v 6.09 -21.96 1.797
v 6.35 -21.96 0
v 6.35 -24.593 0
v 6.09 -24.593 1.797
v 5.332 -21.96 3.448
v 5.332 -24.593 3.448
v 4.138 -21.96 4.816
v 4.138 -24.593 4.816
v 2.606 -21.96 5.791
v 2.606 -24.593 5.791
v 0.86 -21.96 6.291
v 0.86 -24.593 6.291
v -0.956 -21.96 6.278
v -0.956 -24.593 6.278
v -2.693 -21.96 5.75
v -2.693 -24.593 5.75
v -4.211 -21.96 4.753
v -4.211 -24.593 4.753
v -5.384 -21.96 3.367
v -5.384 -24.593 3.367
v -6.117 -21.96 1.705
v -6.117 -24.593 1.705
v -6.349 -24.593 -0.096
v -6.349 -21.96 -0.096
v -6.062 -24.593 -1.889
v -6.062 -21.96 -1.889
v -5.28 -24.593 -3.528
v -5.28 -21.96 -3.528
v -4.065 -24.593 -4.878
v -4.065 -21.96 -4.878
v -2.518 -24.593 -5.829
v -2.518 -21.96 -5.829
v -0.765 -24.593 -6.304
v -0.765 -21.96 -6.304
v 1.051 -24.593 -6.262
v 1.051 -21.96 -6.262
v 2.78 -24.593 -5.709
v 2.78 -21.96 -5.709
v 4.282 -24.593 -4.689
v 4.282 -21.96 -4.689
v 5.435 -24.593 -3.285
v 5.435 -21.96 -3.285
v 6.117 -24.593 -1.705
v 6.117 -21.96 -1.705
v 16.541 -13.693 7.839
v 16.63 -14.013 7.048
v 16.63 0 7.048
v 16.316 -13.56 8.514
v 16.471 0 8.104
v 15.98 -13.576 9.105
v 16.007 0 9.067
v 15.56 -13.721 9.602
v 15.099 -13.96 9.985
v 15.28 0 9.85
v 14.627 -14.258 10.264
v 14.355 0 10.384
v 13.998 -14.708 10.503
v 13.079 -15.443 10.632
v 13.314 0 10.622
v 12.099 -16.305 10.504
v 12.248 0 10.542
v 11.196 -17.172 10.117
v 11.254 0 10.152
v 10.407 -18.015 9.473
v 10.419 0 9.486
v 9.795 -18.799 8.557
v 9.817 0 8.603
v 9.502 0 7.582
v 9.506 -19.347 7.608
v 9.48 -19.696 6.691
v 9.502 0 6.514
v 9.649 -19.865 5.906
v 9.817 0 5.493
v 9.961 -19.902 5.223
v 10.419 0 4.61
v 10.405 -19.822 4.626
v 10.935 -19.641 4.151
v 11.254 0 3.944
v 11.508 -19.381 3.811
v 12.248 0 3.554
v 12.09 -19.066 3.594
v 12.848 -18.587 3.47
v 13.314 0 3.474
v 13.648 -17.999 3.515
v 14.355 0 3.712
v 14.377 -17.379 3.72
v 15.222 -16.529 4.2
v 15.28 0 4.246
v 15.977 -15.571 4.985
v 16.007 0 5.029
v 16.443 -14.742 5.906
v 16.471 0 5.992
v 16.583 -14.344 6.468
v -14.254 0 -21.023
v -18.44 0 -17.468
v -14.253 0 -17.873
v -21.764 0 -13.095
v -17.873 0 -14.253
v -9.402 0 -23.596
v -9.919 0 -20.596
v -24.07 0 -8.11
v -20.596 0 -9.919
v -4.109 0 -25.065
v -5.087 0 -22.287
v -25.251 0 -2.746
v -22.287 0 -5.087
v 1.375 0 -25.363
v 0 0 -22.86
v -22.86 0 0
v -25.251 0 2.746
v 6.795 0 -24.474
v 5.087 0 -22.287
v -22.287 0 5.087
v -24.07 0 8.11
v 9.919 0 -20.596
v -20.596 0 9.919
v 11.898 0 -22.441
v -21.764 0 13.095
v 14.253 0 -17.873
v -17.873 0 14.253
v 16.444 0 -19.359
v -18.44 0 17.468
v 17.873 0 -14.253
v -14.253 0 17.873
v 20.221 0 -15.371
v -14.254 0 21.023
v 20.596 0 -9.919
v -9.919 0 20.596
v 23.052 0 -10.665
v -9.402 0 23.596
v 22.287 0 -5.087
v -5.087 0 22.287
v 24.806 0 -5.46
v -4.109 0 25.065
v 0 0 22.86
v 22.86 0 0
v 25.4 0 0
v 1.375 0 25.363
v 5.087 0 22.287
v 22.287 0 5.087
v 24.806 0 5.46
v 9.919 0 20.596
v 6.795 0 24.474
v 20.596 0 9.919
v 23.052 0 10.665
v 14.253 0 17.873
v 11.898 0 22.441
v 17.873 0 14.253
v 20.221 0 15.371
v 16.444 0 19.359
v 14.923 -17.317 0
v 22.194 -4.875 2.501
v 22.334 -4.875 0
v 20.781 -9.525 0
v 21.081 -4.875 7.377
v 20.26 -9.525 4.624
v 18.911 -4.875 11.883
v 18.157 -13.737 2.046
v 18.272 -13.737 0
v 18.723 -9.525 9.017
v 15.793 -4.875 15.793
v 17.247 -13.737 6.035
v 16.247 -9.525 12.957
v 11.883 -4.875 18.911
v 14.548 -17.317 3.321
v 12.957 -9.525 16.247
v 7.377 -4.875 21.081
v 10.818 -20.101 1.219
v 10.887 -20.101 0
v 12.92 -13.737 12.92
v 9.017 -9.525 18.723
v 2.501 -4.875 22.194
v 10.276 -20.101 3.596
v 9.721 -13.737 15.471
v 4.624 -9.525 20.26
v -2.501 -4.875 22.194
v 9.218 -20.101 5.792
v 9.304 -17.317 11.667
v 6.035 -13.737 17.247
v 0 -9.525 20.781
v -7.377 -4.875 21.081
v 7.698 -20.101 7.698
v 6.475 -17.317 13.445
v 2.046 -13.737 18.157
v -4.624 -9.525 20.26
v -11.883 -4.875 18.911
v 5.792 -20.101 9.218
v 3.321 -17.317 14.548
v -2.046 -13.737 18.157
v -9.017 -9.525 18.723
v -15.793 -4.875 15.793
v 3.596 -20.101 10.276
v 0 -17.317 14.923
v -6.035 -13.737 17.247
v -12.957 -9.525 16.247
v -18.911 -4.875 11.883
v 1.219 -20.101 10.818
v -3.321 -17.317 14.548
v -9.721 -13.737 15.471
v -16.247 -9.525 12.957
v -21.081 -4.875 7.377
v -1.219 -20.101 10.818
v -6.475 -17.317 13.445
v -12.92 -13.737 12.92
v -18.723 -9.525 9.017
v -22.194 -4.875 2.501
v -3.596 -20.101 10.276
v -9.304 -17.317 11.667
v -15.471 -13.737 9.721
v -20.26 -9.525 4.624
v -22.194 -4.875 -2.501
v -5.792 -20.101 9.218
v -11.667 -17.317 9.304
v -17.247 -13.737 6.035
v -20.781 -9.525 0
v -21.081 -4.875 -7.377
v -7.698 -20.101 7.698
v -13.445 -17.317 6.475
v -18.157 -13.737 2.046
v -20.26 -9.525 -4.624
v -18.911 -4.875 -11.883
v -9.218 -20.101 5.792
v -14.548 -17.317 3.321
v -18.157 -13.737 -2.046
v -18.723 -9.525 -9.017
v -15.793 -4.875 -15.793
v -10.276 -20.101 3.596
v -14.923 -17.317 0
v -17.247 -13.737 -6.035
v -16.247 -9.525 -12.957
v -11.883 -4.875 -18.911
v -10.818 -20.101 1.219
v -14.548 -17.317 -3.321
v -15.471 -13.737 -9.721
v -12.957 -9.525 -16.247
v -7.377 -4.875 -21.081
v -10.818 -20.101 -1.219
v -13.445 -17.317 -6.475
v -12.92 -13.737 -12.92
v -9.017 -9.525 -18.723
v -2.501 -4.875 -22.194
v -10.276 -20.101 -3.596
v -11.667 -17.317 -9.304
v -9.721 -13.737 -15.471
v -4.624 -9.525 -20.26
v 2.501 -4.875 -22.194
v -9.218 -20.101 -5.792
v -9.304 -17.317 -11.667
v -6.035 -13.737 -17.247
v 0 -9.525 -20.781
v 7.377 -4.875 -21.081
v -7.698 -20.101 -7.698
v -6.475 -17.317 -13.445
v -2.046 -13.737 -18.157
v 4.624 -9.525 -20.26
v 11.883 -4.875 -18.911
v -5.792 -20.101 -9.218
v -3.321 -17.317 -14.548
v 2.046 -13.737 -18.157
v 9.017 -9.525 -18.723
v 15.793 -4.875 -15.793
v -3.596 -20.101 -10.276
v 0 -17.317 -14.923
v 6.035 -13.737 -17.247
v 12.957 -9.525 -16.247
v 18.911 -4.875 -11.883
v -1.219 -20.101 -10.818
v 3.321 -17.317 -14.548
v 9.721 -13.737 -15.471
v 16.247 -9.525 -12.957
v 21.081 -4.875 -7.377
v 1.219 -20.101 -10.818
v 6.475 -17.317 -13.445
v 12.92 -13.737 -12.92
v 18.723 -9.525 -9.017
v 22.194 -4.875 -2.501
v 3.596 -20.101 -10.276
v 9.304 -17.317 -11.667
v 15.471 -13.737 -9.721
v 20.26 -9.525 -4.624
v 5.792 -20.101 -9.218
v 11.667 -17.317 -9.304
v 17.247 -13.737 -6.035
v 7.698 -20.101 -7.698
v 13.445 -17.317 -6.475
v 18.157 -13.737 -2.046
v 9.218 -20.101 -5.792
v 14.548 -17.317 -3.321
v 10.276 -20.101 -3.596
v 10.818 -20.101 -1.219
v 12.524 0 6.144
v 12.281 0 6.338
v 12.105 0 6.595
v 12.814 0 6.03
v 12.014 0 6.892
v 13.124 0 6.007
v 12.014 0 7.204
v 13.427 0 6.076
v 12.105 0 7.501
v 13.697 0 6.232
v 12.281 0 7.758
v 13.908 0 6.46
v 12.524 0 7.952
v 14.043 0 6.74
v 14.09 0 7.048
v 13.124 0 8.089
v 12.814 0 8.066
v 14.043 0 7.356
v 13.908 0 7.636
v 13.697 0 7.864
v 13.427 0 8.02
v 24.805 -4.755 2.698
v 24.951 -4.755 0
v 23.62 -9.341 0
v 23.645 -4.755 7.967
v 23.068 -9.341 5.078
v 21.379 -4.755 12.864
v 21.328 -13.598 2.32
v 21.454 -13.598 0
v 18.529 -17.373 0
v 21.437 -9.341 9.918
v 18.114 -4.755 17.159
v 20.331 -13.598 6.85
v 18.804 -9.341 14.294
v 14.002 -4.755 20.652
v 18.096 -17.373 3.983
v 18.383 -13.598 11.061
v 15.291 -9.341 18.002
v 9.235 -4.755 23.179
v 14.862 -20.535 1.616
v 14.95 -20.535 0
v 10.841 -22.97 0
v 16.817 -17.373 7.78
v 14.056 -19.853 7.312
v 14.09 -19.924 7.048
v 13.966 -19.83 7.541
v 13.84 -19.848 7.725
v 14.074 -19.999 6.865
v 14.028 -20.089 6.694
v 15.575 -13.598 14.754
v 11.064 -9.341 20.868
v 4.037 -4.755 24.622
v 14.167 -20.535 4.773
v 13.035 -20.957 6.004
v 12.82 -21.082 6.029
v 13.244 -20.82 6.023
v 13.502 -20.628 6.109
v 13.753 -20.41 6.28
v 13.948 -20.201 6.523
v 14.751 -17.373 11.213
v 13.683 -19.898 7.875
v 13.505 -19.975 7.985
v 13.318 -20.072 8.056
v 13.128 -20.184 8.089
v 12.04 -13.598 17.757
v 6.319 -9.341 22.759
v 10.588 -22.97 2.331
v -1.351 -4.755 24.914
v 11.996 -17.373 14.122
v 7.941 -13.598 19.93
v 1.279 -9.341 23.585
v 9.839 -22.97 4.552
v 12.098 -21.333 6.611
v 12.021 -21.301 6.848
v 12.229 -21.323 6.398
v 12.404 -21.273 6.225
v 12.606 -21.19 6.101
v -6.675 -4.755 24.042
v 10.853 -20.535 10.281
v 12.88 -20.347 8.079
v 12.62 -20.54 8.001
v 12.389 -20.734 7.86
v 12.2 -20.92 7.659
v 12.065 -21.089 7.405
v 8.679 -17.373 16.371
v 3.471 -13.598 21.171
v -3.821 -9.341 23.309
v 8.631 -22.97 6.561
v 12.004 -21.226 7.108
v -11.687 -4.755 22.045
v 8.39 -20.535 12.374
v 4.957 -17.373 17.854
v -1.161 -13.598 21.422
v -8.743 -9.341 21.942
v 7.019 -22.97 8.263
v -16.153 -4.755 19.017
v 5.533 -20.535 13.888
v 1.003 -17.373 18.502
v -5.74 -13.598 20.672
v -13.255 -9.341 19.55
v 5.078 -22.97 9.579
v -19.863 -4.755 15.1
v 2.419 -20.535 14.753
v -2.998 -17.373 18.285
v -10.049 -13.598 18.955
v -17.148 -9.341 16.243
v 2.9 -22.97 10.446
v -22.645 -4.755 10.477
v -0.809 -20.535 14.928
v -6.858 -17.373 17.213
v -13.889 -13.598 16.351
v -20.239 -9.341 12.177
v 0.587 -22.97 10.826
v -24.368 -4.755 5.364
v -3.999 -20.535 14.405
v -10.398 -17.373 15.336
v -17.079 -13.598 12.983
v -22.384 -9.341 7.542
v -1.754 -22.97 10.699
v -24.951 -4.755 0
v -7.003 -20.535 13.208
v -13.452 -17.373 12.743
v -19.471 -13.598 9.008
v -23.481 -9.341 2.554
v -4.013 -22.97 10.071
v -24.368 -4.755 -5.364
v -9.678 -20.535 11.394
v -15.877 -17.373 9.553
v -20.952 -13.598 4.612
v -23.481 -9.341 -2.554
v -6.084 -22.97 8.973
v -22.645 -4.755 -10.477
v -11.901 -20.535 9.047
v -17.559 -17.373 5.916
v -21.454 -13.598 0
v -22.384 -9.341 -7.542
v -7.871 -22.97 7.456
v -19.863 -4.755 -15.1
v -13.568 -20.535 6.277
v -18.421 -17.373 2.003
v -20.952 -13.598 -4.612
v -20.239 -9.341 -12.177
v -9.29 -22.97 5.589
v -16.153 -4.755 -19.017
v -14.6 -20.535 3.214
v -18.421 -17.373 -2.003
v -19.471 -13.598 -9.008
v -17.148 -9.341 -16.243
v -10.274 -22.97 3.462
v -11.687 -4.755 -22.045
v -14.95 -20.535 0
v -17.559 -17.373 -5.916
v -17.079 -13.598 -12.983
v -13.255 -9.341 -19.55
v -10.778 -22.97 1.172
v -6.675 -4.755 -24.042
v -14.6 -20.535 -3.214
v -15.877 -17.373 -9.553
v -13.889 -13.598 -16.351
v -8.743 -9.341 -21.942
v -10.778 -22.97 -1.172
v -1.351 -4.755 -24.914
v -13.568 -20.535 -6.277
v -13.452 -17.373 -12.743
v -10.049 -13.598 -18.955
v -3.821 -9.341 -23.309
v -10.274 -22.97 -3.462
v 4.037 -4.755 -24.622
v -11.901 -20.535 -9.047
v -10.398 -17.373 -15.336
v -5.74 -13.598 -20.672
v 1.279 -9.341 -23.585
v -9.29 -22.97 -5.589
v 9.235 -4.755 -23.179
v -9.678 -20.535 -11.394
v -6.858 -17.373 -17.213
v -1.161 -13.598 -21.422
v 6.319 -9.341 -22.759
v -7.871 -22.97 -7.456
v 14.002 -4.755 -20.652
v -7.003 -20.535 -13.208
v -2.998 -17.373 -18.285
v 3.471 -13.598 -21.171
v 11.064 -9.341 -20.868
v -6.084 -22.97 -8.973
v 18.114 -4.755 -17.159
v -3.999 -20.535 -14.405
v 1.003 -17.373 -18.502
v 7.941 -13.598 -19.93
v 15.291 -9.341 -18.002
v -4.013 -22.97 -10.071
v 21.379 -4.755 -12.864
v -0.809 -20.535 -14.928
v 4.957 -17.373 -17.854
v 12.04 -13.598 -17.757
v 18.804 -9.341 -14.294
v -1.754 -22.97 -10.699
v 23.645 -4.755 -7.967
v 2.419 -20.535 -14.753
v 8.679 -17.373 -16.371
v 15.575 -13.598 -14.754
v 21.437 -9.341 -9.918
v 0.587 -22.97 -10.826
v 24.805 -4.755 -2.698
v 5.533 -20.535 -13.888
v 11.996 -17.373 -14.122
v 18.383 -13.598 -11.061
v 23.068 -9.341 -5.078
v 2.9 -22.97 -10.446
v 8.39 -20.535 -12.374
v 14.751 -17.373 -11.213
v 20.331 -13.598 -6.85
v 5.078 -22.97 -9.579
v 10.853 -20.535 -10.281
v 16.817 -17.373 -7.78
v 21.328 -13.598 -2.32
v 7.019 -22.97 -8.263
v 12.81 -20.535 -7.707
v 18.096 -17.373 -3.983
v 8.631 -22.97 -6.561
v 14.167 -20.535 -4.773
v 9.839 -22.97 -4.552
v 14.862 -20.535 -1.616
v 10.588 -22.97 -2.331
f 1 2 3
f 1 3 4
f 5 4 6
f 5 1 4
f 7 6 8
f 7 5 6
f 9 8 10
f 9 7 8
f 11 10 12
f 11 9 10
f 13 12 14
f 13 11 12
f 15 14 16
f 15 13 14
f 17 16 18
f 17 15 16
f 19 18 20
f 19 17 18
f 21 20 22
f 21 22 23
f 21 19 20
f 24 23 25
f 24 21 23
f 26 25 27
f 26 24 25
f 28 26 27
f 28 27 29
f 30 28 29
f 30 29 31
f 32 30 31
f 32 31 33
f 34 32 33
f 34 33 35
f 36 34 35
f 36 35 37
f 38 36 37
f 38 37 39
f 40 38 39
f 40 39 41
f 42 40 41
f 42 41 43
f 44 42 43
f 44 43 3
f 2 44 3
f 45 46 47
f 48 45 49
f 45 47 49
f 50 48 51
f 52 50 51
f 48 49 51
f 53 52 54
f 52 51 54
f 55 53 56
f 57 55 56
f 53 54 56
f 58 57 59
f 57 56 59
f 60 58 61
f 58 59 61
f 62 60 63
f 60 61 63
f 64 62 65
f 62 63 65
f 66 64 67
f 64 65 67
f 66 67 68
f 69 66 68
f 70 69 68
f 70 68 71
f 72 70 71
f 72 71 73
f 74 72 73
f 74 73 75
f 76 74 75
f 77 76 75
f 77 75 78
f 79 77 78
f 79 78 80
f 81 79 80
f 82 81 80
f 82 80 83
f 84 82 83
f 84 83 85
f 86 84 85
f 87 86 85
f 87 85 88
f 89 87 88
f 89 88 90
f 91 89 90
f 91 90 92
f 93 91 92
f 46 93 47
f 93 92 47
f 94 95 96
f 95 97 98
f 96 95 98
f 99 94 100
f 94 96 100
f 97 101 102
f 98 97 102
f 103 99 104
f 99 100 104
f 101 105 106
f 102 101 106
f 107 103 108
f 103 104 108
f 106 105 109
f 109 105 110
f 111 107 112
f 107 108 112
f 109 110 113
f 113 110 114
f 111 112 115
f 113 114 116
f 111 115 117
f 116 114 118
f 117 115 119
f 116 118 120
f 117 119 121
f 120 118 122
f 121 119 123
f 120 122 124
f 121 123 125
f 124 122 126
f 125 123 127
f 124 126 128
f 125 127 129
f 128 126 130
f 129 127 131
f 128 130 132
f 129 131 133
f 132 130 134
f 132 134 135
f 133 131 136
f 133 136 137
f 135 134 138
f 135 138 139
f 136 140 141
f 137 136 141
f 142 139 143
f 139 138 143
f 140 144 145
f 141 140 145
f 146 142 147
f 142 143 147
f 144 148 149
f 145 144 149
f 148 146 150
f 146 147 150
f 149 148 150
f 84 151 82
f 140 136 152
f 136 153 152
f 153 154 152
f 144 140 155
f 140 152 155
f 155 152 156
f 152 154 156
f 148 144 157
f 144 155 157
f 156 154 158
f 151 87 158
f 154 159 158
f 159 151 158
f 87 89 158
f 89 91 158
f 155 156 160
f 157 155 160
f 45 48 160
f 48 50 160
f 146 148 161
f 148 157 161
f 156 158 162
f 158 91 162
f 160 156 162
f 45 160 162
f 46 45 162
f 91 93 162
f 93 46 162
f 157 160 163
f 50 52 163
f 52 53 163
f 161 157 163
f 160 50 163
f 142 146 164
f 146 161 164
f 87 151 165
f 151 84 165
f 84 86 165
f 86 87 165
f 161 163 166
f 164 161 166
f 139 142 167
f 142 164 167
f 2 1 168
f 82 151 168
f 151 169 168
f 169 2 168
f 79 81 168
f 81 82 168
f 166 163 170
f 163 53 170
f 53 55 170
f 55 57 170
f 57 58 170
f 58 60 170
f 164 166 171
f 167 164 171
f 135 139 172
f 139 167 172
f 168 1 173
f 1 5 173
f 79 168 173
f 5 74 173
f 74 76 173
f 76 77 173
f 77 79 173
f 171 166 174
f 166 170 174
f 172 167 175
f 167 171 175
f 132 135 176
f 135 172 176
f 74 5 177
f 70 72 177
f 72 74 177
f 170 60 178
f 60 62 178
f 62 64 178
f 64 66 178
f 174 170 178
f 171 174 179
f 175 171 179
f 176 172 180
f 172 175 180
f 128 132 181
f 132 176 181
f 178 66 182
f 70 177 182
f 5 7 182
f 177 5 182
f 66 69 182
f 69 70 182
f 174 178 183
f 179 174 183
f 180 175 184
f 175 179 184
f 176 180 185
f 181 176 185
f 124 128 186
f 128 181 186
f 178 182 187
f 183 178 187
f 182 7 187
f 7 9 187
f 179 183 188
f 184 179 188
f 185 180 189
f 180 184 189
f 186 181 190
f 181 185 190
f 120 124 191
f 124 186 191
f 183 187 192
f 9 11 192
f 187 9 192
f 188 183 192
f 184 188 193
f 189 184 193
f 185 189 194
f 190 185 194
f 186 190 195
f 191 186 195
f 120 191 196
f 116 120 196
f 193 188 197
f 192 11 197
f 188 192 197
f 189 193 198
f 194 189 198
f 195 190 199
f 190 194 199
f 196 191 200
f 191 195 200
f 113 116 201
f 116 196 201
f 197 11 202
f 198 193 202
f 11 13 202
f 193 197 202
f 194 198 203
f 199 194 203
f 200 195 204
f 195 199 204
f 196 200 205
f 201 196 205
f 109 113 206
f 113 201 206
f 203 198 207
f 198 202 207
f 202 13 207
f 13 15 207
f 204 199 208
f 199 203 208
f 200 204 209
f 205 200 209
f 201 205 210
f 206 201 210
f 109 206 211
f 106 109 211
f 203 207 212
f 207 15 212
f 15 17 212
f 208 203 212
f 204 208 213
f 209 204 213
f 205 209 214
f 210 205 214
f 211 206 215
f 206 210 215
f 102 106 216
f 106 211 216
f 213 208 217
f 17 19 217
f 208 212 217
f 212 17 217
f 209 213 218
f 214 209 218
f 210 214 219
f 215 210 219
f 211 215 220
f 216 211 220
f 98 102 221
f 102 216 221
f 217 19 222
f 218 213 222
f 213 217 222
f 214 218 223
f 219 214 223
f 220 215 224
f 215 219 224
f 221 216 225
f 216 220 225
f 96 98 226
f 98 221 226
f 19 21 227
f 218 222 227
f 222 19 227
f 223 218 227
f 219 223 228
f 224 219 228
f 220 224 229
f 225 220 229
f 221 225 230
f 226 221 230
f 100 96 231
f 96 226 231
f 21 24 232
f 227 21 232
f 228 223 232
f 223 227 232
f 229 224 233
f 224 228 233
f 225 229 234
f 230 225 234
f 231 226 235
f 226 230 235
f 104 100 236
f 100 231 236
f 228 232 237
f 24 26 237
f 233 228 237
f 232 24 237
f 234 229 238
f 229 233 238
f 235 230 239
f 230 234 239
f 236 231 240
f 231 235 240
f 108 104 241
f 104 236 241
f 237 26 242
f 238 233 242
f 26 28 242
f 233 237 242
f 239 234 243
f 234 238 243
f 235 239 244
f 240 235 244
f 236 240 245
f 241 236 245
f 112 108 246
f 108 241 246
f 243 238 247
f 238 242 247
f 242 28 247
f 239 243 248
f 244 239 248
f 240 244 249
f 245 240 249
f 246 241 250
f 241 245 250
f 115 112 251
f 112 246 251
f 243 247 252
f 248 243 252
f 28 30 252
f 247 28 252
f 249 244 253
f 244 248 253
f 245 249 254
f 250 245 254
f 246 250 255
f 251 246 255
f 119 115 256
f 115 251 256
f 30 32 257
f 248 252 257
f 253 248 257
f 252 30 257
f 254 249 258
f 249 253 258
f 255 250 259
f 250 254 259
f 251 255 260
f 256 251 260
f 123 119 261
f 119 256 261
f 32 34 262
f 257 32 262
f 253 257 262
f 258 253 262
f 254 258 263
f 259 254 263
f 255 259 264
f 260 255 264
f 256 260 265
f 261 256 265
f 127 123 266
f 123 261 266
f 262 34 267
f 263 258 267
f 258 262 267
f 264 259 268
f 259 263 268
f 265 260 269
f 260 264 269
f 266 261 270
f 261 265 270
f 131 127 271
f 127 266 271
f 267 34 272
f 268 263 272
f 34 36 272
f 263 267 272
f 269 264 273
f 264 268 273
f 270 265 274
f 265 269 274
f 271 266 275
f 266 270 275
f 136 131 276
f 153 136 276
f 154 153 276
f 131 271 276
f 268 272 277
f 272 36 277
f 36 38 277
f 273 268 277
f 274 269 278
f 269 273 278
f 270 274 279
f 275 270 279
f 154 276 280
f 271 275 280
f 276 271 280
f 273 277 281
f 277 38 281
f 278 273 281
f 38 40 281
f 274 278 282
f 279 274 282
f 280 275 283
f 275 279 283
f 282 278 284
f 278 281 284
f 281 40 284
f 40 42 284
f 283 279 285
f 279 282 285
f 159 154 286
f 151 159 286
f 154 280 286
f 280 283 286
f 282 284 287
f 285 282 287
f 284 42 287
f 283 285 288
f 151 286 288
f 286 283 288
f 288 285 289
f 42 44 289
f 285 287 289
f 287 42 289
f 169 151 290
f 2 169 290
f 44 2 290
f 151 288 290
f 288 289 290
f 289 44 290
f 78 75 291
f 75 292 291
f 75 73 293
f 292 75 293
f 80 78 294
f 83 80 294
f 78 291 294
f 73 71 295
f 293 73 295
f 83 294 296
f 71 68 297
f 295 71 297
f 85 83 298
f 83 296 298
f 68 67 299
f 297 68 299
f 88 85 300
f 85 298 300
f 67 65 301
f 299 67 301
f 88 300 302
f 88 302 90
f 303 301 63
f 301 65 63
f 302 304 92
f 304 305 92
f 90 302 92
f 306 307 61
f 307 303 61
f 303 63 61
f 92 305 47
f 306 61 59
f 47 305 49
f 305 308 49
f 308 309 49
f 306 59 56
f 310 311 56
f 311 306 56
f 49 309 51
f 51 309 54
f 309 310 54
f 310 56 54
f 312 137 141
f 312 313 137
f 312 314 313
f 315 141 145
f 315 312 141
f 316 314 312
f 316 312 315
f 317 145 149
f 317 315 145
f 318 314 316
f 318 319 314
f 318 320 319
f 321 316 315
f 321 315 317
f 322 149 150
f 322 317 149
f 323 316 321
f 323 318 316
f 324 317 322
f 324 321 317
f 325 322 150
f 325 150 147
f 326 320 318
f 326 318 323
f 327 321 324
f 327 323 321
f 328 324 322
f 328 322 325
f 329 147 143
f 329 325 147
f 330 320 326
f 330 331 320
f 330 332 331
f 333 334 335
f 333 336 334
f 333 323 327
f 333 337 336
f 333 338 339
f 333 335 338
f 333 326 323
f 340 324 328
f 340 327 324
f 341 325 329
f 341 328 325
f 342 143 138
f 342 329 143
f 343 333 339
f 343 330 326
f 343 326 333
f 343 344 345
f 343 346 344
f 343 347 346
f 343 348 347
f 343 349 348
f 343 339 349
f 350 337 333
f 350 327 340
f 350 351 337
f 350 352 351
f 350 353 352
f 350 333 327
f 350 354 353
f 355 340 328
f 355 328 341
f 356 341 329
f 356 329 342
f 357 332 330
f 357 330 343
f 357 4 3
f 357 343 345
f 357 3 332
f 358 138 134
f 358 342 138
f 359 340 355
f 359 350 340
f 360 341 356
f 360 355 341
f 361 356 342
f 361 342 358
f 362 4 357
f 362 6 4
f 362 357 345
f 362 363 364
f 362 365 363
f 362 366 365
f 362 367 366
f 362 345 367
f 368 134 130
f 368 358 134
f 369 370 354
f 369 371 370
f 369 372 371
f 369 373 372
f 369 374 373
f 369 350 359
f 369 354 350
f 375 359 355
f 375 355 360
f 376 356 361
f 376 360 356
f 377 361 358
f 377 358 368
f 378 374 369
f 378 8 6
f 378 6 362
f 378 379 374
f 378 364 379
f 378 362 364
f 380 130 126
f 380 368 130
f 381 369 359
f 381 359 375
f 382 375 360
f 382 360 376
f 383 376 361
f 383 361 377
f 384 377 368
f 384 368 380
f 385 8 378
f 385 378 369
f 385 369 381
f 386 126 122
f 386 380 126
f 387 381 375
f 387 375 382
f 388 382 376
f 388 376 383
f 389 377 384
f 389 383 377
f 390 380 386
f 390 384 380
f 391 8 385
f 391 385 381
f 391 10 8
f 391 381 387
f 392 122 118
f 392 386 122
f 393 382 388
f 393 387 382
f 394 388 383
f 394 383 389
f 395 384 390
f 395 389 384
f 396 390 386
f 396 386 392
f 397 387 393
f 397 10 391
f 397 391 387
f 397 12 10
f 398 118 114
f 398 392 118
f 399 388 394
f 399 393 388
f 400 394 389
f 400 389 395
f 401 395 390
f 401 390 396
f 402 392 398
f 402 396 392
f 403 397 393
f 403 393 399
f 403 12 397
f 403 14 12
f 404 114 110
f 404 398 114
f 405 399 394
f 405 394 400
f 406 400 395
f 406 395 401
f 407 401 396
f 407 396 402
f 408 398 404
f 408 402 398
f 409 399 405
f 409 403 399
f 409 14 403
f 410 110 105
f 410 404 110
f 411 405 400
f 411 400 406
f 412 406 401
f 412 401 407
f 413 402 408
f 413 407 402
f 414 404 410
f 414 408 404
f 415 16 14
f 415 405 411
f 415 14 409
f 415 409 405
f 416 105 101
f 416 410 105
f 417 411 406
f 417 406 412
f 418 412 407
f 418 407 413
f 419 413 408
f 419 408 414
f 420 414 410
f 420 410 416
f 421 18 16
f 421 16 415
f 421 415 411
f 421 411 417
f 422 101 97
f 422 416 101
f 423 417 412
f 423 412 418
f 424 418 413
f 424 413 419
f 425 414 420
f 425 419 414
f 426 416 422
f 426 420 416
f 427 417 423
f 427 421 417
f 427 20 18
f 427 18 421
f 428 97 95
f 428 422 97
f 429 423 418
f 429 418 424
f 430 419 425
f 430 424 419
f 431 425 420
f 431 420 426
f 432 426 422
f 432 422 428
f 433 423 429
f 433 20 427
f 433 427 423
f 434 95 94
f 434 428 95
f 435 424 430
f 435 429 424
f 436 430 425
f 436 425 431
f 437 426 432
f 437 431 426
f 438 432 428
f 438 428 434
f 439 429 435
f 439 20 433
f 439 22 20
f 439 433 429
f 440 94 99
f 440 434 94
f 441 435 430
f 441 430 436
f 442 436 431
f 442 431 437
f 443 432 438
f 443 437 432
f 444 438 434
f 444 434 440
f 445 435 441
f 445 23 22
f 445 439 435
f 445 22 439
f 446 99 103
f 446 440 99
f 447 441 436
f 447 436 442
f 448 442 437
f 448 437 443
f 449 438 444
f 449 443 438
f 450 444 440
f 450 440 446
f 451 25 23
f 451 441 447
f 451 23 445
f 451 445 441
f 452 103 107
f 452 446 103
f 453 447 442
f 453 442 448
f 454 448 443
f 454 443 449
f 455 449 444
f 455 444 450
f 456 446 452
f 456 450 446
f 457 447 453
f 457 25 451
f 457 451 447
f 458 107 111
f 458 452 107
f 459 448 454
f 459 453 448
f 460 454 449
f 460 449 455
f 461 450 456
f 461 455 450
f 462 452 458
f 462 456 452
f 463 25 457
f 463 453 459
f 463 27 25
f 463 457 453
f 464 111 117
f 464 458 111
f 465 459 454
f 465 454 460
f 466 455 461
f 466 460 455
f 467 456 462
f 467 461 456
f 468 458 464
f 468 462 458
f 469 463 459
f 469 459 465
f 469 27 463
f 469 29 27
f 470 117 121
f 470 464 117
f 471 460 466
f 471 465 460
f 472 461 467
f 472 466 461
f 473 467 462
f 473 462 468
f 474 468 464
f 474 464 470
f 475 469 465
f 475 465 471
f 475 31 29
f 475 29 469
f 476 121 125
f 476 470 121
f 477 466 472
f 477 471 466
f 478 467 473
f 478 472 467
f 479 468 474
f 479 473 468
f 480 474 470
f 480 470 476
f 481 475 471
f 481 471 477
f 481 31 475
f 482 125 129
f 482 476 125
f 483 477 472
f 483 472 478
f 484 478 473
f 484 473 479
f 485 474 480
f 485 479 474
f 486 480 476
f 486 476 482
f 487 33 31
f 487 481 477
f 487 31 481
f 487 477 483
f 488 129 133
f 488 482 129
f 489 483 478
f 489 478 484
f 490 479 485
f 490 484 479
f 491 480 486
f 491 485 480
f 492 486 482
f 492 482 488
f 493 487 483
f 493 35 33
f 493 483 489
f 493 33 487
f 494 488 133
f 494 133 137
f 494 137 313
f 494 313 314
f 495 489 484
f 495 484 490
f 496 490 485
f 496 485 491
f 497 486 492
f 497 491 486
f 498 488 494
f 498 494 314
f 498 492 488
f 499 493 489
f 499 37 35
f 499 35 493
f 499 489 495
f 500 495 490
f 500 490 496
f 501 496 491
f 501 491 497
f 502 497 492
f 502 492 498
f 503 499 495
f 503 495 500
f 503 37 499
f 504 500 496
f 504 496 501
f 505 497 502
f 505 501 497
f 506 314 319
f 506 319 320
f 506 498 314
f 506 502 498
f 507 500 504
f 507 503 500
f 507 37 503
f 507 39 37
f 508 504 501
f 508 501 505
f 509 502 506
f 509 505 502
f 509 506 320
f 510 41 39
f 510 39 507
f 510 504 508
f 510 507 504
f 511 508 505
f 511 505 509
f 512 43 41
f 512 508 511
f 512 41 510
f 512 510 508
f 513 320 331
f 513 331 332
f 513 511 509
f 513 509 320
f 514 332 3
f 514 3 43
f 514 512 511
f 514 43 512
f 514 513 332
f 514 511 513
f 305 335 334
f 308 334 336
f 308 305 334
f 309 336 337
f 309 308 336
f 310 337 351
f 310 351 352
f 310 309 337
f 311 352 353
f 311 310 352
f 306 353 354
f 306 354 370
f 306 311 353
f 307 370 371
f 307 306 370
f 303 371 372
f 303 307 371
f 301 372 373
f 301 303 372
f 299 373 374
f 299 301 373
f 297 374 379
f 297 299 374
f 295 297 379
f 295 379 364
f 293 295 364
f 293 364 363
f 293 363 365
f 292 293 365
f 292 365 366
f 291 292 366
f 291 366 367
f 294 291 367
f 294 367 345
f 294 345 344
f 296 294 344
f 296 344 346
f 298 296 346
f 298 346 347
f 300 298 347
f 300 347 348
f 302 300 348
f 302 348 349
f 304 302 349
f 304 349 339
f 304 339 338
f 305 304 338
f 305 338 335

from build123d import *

# Parameters (mm, degrees)
F0_R     = 25.4
F0_R_2   = 1.0439291231
F1_DEPTH = 25.4
F3_T     = -2.54
F4_R     = 6.35
F5_DEPTH = 50.8


# Not quite as in the source:
# - a fillet or chamfer that OpenCascade refuses, or shapes differently, is made with other operations: its cross-section is extruded or revolved along the edge and cut away or added


with BuildPart() as f1:
    # F0 (on Front) → F1 (new body)
    with BuildSketch(Plane.XZ):
        Circle(F0_R)
        with Locations((13.0458941537, 7.0479529987)):
            Circle(F0_R_2, mode=Mode.SUBTRACT)
    extrude(amount=F1_DEPTH)

    # F2: fillet of radius 25.4 on 1 edges, made by hand

    # F2_s1 → F2_t2 (revolve, cut)
    with BuildSketch(Plane.XY):
        with BuildLine():
            ThreePointArc((25.4, 0), (17.9605122421, -17.9605122421), (0, -25.4))
            Line((0, -25.4), (25.4, -25.4))
            Line((25.4, -25.4), (25.4, 0))
        make_face()
    revolve(axis=Axis((0, -25.4, 0), (0, -1, 0)), mode=Mode.SUBTRACT)

    # F3
    f3_openings = [f1.faces().sort_by_distance(p)[0] for p in [
        (-0.022074, 0, -0.011925),
    ]]
    offset(amount=F3_T, openings=f3_openings)

    # F4 (on Front) → F5 (cut)
    with BuildSketch(Plane.XZ):
        Circle(F4_R)
    extrude(amount=F5_DEPTH, mode=Mode.SUBTRACT)


solid = f1.part
